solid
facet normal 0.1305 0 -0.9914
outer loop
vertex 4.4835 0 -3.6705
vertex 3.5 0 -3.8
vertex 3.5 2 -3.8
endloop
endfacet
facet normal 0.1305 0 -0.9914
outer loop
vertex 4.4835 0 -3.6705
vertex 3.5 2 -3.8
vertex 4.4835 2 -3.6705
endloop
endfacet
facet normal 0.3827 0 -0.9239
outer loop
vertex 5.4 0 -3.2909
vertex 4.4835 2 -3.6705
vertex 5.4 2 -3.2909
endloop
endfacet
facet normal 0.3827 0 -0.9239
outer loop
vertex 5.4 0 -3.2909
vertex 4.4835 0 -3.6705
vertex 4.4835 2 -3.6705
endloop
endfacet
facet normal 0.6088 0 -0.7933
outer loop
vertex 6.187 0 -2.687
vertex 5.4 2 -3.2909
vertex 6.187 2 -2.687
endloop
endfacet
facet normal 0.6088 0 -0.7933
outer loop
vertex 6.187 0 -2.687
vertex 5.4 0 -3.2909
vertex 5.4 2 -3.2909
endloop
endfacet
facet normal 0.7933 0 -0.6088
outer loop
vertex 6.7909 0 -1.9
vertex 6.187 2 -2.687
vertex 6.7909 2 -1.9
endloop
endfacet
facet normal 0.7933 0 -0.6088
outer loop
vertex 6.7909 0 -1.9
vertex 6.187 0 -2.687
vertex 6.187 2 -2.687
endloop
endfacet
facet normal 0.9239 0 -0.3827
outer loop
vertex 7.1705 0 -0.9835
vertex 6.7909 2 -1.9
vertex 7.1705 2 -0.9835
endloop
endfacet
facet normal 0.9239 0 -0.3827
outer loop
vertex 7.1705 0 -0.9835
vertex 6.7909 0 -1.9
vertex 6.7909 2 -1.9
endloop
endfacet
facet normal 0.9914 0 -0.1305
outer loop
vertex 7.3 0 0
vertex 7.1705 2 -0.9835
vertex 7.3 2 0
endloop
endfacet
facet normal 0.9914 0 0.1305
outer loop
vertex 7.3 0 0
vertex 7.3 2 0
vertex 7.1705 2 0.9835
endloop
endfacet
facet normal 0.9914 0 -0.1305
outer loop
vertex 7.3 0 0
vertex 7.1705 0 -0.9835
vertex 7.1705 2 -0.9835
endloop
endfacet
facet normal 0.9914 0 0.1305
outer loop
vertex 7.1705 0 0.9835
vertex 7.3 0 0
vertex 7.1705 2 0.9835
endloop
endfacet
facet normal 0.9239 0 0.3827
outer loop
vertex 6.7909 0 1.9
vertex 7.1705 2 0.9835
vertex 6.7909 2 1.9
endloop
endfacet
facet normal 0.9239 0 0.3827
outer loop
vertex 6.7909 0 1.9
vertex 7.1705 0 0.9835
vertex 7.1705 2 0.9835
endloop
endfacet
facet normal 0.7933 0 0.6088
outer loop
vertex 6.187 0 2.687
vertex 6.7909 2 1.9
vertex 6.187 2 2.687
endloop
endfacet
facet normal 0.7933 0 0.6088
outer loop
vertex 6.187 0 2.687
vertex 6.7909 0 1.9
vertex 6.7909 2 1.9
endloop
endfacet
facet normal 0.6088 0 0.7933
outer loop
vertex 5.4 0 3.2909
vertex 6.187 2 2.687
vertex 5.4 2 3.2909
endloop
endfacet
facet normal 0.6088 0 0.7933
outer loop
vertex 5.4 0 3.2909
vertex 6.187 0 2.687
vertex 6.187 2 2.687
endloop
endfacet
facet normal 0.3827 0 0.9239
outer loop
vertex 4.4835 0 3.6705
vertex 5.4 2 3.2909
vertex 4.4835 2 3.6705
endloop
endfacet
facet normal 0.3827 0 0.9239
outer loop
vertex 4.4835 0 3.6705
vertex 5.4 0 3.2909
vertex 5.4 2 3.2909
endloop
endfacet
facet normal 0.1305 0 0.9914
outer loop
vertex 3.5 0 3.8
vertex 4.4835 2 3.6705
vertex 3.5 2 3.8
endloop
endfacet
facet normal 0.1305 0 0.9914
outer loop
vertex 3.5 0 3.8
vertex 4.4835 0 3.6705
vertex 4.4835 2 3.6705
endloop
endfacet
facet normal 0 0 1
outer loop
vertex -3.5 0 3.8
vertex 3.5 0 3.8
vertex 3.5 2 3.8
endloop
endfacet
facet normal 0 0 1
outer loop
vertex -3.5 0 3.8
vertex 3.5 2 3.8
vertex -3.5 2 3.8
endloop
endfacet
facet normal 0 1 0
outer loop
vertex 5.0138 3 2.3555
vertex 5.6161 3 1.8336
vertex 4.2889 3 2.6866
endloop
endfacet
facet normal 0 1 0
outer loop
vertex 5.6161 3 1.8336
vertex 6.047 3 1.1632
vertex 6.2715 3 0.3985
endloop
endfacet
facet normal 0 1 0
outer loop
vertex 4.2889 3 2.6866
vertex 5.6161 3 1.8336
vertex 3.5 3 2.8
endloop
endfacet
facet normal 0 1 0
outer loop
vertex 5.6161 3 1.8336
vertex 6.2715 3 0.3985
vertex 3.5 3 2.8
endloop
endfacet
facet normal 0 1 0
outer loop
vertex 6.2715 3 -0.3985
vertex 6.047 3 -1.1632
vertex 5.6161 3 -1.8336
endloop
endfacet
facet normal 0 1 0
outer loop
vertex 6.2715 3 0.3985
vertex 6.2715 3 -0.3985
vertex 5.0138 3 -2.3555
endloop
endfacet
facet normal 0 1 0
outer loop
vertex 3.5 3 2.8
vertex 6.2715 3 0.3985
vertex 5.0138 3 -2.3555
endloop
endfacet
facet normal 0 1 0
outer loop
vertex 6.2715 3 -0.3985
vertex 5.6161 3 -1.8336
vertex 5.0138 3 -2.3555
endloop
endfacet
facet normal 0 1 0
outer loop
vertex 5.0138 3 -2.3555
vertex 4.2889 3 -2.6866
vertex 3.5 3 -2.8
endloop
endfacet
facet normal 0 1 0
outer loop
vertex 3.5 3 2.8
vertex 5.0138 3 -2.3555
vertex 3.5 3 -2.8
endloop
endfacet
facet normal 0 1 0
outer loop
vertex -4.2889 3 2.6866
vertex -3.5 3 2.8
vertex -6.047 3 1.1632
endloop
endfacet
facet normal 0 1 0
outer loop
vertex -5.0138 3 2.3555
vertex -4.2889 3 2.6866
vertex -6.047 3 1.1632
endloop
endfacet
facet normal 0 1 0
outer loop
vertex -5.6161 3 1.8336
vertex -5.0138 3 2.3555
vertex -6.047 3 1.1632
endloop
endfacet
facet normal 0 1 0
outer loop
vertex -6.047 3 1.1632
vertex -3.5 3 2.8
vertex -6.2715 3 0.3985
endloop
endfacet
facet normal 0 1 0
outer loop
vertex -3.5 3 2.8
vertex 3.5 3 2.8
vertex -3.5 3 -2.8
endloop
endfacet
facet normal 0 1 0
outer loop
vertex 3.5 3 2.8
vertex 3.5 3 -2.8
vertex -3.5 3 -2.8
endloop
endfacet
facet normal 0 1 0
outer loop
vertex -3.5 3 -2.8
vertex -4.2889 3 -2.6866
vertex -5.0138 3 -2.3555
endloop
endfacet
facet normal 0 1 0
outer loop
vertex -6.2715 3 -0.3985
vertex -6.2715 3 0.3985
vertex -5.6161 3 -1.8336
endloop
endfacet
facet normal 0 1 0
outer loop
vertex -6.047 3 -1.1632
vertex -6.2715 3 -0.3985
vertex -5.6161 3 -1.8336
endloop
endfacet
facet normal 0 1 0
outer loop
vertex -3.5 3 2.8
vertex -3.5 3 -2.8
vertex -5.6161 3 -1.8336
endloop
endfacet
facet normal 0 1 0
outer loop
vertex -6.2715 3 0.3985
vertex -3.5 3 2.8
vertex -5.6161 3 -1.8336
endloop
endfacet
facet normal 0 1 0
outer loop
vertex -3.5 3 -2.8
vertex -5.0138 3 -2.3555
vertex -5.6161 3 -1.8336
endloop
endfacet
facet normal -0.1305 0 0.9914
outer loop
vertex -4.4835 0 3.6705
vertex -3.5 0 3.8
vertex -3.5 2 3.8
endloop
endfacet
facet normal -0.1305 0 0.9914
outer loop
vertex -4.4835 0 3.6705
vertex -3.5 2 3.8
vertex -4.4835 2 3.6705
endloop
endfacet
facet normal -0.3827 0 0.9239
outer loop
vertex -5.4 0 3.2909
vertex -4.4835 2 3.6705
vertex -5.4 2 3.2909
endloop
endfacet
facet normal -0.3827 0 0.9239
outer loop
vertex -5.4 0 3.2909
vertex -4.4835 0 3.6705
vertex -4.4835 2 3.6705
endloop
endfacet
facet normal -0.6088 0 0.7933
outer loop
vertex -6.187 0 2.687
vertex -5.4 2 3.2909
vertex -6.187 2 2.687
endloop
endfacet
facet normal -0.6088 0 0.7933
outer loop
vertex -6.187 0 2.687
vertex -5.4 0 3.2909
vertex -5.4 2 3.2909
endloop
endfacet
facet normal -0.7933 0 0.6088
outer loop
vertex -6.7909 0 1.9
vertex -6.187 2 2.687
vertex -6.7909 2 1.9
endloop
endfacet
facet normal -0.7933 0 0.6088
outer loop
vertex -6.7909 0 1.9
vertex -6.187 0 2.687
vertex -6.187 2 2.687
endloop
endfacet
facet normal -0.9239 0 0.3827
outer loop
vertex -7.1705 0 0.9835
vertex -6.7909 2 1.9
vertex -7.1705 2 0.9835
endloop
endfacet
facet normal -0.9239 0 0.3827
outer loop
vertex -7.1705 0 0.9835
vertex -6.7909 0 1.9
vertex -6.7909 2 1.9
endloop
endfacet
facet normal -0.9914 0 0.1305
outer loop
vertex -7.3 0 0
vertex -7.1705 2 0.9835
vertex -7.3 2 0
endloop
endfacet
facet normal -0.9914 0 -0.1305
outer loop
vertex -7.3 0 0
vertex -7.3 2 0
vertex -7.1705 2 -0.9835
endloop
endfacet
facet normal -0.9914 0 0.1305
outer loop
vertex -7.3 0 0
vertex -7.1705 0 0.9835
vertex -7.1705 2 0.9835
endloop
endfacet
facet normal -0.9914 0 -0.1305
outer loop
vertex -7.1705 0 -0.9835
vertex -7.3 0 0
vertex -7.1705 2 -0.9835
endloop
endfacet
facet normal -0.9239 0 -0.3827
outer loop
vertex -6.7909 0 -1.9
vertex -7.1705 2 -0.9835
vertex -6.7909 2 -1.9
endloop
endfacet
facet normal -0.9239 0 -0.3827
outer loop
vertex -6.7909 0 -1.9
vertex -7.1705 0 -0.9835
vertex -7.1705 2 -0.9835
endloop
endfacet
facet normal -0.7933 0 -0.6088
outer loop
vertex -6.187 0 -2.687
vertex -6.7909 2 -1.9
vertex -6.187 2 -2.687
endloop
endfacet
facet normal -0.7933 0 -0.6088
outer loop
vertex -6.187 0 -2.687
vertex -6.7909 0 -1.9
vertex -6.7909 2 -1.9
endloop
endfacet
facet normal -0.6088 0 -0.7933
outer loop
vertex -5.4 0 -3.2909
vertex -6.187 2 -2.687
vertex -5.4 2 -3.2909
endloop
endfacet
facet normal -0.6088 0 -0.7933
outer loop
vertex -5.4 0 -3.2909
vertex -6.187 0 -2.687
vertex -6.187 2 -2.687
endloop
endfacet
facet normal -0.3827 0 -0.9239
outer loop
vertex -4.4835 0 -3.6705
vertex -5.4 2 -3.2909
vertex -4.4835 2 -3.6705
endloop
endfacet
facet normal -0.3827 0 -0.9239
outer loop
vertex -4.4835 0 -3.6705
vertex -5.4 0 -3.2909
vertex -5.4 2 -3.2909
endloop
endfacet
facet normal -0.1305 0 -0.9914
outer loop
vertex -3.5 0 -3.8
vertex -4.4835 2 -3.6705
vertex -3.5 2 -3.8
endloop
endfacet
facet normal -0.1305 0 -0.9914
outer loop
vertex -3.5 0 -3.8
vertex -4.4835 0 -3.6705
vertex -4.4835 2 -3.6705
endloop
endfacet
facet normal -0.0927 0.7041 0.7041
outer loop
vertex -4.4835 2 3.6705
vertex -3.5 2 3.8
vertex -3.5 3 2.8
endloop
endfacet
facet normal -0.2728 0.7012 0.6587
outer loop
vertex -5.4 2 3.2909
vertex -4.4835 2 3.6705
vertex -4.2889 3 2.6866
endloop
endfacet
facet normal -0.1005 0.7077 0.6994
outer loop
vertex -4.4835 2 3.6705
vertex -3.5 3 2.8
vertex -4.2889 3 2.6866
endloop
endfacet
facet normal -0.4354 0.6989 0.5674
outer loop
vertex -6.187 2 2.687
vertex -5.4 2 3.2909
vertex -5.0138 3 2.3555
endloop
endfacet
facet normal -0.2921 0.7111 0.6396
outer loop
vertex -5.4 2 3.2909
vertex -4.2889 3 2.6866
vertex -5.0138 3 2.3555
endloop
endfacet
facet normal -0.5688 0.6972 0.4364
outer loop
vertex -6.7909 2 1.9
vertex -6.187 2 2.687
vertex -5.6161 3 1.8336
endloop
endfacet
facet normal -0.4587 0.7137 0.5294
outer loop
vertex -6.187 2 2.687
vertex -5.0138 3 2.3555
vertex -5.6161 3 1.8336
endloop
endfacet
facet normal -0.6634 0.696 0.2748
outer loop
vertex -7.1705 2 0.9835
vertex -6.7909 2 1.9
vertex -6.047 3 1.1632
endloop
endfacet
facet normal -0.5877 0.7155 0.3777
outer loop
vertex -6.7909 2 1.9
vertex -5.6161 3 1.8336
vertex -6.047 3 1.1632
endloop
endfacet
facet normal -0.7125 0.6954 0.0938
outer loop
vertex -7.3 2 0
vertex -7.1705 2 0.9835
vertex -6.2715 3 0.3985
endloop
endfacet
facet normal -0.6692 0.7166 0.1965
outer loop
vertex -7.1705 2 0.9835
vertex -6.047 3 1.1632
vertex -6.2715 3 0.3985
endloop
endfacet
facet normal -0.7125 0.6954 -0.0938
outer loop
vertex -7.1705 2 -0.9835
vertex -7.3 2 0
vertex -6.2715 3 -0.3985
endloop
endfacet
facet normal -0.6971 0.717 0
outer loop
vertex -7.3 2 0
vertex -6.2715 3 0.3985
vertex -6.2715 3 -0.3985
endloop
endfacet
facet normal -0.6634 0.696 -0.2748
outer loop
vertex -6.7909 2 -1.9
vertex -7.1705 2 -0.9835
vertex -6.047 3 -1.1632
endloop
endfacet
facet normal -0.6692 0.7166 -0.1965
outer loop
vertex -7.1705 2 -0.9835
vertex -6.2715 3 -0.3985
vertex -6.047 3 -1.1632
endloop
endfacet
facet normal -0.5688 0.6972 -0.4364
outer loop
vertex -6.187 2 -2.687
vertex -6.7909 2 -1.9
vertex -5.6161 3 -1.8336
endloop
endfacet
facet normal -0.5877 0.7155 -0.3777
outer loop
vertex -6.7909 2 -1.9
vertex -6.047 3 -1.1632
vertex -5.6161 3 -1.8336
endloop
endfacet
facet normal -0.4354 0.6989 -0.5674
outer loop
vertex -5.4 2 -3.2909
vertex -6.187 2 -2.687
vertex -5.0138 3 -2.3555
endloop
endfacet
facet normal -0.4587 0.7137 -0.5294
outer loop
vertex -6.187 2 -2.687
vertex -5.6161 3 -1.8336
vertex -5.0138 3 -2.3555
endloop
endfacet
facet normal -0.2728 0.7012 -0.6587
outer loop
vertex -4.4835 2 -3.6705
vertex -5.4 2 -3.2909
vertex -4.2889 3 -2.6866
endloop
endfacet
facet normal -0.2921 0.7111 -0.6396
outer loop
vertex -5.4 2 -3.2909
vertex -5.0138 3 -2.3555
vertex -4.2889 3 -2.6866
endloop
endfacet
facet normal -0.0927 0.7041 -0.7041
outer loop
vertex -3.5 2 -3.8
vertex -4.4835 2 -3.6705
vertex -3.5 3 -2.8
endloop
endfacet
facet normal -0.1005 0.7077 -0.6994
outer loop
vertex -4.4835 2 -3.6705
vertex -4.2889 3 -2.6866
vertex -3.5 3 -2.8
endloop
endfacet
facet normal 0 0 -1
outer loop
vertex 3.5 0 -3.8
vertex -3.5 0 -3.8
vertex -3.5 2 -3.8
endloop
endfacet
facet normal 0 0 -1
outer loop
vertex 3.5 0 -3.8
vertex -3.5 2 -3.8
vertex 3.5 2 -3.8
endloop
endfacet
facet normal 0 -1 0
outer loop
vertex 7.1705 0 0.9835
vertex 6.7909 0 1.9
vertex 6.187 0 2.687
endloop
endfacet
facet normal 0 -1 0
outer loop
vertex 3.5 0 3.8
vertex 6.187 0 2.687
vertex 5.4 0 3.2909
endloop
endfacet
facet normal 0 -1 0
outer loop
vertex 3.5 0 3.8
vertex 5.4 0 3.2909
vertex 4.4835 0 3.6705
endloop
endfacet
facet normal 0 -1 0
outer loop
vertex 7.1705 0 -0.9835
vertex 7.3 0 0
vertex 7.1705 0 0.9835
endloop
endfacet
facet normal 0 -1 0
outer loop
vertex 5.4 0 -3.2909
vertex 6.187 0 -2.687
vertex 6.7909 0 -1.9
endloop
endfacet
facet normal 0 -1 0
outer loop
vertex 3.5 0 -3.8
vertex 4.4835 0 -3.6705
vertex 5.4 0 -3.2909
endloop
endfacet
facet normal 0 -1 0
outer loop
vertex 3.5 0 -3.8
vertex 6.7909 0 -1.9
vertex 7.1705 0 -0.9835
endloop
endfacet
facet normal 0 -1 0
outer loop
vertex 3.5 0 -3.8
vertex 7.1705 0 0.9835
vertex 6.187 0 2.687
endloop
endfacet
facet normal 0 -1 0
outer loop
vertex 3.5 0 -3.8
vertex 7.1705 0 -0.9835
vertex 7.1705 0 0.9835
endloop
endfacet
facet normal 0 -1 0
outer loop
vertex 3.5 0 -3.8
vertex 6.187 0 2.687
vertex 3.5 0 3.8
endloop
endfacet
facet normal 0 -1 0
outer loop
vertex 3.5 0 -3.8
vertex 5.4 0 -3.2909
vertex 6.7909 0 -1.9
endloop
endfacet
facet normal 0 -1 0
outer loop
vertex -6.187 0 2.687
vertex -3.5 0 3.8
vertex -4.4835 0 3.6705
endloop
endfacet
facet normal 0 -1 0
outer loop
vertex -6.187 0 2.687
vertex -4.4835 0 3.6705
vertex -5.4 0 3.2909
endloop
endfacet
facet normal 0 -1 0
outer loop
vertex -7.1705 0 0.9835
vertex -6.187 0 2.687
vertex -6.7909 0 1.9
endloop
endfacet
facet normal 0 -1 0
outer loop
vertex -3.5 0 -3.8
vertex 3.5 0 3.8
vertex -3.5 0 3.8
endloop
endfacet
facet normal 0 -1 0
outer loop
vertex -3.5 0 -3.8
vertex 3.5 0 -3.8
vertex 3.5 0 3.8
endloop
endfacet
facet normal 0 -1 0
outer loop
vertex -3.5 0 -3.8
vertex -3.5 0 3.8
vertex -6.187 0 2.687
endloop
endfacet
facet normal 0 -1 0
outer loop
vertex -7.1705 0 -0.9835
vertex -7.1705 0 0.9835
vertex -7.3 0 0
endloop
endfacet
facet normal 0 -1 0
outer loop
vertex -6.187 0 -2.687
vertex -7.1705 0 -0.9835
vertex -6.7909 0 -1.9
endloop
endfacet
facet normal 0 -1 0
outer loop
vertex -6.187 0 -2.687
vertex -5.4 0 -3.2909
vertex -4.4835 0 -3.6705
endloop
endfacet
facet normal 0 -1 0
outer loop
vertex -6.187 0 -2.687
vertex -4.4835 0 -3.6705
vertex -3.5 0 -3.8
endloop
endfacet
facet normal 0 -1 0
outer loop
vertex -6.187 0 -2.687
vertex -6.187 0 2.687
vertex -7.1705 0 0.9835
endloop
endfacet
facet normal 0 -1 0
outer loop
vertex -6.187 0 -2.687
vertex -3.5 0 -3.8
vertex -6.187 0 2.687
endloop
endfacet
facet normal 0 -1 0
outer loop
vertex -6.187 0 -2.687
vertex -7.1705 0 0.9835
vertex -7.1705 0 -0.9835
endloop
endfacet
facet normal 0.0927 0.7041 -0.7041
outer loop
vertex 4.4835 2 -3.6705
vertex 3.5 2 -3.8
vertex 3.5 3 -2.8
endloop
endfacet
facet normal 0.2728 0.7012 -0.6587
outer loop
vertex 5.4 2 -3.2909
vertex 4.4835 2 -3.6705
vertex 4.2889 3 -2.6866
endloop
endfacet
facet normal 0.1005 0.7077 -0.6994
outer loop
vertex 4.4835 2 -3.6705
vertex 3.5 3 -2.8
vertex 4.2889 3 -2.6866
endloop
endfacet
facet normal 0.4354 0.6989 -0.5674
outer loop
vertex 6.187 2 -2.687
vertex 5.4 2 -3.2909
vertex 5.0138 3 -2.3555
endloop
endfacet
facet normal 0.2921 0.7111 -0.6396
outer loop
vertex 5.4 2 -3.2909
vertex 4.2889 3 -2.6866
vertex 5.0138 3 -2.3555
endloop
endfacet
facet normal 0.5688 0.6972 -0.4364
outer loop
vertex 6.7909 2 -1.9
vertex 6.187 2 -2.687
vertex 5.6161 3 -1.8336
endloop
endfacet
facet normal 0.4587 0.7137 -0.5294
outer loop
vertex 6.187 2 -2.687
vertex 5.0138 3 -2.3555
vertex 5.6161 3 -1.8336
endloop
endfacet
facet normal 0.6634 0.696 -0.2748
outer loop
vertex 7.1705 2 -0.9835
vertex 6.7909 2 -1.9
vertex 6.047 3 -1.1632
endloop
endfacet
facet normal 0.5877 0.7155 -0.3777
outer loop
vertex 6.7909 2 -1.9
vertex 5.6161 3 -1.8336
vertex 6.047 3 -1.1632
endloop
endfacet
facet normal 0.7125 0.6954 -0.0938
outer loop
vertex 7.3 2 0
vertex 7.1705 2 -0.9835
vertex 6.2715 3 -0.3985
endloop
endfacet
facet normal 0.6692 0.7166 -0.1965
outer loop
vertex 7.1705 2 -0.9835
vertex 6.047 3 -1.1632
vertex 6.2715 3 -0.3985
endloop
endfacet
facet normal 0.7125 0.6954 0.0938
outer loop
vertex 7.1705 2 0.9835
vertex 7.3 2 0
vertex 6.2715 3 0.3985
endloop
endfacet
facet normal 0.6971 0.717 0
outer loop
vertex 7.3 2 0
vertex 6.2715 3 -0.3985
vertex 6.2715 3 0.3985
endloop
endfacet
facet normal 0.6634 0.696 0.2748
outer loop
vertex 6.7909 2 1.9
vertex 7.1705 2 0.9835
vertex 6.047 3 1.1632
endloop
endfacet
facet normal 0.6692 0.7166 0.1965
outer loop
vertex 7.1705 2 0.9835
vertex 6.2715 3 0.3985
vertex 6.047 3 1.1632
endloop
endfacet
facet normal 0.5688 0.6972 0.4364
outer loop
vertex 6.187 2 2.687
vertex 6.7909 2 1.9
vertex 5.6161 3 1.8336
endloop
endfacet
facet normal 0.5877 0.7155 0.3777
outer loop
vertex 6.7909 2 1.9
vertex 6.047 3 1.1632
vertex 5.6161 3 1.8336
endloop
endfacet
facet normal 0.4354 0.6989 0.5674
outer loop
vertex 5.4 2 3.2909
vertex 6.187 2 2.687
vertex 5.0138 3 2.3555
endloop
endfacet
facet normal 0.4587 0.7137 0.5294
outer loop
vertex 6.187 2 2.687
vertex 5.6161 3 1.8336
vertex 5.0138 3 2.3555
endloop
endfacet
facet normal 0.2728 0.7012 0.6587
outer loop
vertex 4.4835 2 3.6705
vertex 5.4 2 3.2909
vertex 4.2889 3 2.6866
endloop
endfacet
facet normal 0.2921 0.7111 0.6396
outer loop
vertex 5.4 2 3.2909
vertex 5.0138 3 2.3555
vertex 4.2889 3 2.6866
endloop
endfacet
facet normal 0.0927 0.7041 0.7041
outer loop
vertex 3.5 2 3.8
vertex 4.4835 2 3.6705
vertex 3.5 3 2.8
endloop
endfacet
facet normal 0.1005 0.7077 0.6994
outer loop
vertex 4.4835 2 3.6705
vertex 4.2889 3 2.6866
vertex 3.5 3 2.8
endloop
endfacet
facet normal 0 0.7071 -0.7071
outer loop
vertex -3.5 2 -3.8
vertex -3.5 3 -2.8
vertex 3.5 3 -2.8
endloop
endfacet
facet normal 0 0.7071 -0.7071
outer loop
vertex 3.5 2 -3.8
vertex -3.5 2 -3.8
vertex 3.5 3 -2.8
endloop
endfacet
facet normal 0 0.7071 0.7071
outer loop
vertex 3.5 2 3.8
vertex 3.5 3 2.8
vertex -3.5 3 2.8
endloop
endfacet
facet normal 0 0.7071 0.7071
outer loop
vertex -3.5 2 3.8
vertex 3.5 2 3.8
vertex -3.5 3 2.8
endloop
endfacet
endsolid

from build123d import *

# Parameters (mm, degrees)
BOSS_EXTRU_1_DEPTH = 3
CHANFREIN1_SIZE    = 1


with BuildPart() as part:
    # Esquisse1 → Boss.-Extru.1 (new body)
    with BuildSketch(Plane(origin=(0, 0, 0), x_dir=(1, 0, 0), z_dir=(0, 1, 0))):
        with BuildLine():
            Line((-3.5, 3.8), (3.5, 3.8))
            ThreePointArc((3.5, 3.8), (7.3, 0), (3.5, -3.8))
            Line((3.5, -3.8), (-3.5, -3.8))
            ThreePointArc((-3.5, -3.8), (-7.3, 0), (-3.5, 3.8))
        make_face()
    extrude(amount=BOSS_EXTRU_1_DEPTH)

    # Chanfrein1
    chanfrein1_edges = [part.edges().sort_by_distance(p)[0] for p in [
        (7.3, 3, 0),
        (0, 3, -3.8),
        (-7.3, 3, 0),
        (0, 3, 3.8),
    ]]
    chamfer(chanfrein1_edges, length=CHANFREIN1_SIZE)


solid = part.part
